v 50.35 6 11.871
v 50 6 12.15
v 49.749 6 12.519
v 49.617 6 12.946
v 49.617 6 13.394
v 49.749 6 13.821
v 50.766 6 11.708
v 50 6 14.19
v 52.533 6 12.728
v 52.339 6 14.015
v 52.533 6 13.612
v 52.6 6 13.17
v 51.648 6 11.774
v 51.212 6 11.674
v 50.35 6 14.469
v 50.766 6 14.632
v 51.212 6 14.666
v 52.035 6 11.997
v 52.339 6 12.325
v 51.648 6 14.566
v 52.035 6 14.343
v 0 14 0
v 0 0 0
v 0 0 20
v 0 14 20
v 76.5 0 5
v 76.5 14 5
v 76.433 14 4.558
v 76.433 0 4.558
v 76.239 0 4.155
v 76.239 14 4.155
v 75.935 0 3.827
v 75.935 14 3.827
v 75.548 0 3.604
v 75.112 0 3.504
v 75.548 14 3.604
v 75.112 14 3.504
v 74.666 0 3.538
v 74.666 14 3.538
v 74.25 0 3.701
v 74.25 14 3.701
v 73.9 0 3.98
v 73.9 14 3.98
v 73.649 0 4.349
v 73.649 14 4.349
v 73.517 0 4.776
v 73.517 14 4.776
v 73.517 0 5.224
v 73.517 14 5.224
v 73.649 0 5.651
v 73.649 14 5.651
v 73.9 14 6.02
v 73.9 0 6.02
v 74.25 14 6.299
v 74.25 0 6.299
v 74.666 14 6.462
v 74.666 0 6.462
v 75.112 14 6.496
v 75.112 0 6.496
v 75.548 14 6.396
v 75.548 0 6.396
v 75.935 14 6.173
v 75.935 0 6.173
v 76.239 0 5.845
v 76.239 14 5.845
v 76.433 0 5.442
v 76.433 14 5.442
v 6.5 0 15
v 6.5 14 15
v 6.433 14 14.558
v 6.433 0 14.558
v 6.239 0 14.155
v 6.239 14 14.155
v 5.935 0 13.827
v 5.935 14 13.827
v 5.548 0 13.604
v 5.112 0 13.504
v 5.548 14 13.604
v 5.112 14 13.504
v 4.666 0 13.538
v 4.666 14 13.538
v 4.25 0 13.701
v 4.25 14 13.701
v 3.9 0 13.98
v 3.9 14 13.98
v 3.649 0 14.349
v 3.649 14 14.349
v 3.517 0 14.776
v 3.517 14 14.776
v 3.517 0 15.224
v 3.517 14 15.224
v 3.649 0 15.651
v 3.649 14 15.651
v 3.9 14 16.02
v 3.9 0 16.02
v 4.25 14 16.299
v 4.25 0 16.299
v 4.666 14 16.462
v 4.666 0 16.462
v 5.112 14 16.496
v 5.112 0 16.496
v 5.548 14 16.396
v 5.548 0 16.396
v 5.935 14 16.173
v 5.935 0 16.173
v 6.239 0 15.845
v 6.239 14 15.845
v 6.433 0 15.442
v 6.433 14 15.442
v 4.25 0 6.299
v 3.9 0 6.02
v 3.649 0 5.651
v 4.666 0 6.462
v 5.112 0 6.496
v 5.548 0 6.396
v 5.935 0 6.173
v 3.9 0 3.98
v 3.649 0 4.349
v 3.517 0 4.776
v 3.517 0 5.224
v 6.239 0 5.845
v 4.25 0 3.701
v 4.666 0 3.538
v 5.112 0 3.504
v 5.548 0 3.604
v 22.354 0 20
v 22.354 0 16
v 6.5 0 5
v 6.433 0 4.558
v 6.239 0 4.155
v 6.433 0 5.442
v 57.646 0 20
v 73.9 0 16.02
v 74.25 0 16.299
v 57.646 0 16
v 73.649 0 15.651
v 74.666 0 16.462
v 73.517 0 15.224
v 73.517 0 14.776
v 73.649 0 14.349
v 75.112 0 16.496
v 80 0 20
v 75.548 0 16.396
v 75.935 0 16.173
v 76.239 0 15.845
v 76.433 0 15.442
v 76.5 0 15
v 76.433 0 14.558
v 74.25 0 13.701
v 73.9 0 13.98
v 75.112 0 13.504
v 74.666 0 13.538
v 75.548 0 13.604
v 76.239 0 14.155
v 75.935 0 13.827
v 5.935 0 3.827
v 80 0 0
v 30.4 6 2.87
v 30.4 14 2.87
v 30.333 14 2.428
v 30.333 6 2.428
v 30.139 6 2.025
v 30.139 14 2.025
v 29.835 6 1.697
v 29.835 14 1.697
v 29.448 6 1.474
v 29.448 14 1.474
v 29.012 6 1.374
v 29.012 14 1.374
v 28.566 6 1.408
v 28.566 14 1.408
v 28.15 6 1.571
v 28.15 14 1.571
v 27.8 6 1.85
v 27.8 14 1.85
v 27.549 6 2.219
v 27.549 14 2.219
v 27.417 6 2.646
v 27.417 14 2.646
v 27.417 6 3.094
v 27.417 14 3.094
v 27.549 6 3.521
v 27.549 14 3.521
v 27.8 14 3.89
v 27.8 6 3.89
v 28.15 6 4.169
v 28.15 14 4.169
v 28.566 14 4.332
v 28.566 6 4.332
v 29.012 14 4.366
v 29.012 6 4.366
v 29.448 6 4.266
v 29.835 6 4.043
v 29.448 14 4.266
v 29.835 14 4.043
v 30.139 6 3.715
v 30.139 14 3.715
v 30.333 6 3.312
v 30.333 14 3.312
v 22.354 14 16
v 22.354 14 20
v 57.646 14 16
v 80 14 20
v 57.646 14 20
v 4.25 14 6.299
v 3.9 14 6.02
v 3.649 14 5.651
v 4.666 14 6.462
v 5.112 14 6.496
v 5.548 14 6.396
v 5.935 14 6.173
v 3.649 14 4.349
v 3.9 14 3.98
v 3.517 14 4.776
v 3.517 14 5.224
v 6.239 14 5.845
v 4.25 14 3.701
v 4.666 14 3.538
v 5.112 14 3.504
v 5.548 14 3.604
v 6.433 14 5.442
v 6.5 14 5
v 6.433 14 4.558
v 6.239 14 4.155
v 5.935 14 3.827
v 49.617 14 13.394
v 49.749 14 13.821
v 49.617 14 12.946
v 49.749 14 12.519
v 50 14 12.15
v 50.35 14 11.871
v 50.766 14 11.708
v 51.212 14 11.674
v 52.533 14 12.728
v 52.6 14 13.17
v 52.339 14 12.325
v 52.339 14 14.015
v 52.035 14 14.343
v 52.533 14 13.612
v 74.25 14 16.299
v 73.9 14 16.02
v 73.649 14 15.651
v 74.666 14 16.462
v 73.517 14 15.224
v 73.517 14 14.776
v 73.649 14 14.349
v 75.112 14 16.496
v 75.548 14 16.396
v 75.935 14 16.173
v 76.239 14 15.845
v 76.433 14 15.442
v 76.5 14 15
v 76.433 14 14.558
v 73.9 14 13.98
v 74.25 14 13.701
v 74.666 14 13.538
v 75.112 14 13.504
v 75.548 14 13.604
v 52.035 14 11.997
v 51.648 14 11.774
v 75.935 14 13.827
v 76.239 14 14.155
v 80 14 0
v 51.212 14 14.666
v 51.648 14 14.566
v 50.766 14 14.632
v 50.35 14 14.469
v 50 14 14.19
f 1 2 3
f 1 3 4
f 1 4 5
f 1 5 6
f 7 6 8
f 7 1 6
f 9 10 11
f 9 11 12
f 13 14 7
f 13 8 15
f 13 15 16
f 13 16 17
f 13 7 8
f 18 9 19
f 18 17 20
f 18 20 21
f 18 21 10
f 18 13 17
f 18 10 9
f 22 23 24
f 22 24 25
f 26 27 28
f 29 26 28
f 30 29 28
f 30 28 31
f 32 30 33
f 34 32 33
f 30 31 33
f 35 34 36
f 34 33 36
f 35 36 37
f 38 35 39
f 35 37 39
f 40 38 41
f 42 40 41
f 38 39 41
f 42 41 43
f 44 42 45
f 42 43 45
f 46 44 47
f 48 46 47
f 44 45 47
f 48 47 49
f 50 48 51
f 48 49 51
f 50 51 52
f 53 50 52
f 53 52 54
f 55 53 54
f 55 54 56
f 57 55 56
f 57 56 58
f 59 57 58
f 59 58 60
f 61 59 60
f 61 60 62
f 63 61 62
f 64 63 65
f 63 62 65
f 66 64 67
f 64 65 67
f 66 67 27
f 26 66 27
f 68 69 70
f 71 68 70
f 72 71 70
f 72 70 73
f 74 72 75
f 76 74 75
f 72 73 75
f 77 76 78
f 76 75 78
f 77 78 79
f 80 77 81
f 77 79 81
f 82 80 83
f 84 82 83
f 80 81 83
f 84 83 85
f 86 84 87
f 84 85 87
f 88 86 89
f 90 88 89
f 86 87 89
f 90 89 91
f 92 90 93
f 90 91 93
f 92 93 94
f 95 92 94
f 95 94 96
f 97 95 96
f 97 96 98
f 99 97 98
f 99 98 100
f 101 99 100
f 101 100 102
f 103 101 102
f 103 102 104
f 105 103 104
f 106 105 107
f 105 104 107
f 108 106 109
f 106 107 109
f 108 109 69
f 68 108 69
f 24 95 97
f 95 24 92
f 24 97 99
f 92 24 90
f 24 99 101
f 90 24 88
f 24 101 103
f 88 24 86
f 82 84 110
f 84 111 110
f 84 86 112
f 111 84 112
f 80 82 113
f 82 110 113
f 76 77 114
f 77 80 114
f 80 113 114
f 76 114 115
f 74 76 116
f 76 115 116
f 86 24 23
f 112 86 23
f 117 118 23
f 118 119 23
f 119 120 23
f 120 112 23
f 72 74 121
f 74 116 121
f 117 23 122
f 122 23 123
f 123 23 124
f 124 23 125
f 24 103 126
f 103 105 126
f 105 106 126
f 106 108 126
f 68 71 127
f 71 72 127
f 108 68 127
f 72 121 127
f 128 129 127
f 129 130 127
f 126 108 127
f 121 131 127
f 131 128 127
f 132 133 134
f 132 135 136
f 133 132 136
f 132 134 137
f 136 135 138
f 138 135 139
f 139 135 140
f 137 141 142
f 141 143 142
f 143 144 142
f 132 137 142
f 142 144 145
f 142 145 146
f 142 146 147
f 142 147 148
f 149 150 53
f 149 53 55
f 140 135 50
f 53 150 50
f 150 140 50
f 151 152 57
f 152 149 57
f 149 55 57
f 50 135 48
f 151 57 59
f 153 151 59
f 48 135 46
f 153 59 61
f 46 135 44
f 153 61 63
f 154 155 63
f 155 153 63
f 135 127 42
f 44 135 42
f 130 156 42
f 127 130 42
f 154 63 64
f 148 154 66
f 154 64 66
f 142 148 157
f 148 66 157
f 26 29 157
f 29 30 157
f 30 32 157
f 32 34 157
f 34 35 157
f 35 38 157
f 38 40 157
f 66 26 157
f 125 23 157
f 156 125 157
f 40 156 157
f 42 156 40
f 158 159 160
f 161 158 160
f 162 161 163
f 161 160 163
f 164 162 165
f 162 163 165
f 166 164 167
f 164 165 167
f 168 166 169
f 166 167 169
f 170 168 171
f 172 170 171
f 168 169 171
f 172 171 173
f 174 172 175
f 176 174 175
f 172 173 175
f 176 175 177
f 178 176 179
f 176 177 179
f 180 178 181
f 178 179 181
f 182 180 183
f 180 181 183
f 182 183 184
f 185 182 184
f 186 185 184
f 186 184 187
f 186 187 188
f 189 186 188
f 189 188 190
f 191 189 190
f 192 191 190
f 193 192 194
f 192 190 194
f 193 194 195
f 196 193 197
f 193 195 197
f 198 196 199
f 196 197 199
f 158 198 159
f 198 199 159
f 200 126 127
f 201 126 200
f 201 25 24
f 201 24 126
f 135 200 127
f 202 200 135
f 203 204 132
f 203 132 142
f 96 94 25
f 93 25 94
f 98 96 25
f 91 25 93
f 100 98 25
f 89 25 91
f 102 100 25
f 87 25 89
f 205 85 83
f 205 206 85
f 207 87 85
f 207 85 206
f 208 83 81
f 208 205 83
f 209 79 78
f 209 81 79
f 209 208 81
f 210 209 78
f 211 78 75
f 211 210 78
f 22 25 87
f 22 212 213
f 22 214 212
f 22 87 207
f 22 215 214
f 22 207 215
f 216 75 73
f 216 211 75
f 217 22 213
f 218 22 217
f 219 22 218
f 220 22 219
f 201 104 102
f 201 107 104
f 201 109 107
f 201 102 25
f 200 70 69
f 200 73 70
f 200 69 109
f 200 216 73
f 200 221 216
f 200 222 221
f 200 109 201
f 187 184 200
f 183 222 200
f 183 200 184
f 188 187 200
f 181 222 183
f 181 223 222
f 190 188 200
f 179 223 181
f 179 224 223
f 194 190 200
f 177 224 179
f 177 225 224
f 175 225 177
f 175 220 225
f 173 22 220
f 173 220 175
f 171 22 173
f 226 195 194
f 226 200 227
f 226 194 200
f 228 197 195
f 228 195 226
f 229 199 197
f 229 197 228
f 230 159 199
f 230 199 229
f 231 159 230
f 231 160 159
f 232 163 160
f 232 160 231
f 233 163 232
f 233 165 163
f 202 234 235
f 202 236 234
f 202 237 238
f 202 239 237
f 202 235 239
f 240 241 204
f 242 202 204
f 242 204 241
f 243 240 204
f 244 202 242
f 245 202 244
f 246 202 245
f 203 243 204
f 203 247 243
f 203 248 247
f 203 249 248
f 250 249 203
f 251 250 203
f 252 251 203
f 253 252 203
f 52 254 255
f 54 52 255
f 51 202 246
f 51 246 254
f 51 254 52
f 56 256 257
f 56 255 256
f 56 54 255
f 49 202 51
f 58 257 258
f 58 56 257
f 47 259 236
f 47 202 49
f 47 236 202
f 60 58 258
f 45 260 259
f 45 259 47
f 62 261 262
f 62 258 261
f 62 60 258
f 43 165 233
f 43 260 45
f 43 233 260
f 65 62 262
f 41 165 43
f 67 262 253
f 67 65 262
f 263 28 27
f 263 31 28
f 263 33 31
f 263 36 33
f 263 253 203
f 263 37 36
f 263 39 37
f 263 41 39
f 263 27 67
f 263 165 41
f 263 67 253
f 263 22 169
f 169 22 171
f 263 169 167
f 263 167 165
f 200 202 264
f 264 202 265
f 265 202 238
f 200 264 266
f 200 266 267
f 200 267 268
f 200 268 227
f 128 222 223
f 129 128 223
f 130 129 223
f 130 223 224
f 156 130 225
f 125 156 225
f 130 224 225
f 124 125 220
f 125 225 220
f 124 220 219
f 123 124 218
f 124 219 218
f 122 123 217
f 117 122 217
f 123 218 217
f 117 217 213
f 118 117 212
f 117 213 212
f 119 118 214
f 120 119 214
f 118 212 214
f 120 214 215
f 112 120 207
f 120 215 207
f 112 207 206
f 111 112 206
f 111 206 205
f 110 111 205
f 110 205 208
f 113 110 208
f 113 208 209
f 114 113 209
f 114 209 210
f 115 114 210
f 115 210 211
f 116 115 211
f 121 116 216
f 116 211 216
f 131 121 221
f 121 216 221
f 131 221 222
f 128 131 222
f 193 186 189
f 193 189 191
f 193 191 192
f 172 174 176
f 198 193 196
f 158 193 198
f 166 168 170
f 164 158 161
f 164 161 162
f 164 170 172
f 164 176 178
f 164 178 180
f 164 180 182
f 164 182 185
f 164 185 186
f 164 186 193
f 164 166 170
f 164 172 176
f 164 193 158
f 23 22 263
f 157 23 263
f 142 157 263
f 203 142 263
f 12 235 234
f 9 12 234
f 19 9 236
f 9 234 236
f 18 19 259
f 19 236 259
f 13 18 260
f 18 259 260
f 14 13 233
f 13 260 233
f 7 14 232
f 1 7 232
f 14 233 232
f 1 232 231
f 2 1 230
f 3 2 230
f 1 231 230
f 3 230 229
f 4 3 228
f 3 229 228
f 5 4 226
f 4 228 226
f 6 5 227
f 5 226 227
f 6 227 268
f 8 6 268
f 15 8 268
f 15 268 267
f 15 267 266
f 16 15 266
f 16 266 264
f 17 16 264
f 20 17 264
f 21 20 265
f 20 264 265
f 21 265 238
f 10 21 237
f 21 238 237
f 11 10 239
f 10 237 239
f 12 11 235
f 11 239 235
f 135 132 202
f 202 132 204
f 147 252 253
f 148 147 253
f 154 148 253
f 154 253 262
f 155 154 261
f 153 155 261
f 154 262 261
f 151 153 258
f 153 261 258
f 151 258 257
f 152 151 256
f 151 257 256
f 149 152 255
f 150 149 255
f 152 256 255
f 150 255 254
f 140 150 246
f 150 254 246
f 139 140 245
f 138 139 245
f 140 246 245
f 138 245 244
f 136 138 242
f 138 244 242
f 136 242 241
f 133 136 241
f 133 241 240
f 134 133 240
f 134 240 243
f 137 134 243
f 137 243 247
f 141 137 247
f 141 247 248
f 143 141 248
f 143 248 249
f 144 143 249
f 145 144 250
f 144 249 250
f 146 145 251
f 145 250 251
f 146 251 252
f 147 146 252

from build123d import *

# Parameters (mm, degrees)
SKETCH1_W           = 80
SKETCH1_H           = 14
BOSS_EXTRUDE1_DEPTH = 20
SKETCH2_W           = 35.292
SKETCH2_H           = 14
CUT_EXTRUDE1_DEPTH  = 4
SKETCH3_R           = 1.5
CUT_EXTRUDE2_DEPTH  = 14
SKETCH4_R           = 1.5
CUT_EXTRUDE3_DEPTH  = 8


with BuildPart() as part:
    # Sketch1 → Boss-Extrude1 (new body)
    with BuildSketch(Plane.XY):
        with Locations((40, 7)):
            Rectangle(SKETCH1_W, SKETCH1_H)
    extrude(amount=BOSS_EXTRUDE1_DEPTH)

    # Sketch2 → Cut-Extrude1 (cut)
    with BuildSketch(Plane.XY.offset(20)):
        with Locations((40, 7)):
            Rectangle(SKETCH2_W, SKETCH2_H)
    extrude(amount=-CUT_EXTRUDE1_DEPTH, mode=Mode.SUBTRACT)

    # Sketch3 → Cut-Extrude2 (cut)
    with BuildSketch(Plane(origin=(0, 14, 0), x_dir=(1, 0, 0), z_dir=(0, 1, 0))):
        with Locations((5, -5)):
            Circle(SKETCH3_R)
        with Locations((5, -15)):
            Circle(SKETCH3_R)
        with Locations((75, -15)):
            Circle(SKETCH3_R)
        with Locations((75, -5)):
            Circle(SKETCH3_R)
    extrude(amount=-CUT_EXTRUDE2_DEPTH, mode=Mode.SUBTRACT)

    # Sketch4 → Cut-Extrude3 (cut)
    with BuildSketch(Plane(origin=(0, 14, 0), x_dir=(1, 0, 0), z_dir=(0, 1, 0))):
        with Locations((28.9, -2.87)):
            Circle(SKETCH4_R)
        with Locations((51.1, -13.17)):
            Circle(SKETCH4_R)
    extrude(amount=-CUT_EXTRUDE3_DEPTH, mode=Mode.SUBTRACT)


solid = part.part
